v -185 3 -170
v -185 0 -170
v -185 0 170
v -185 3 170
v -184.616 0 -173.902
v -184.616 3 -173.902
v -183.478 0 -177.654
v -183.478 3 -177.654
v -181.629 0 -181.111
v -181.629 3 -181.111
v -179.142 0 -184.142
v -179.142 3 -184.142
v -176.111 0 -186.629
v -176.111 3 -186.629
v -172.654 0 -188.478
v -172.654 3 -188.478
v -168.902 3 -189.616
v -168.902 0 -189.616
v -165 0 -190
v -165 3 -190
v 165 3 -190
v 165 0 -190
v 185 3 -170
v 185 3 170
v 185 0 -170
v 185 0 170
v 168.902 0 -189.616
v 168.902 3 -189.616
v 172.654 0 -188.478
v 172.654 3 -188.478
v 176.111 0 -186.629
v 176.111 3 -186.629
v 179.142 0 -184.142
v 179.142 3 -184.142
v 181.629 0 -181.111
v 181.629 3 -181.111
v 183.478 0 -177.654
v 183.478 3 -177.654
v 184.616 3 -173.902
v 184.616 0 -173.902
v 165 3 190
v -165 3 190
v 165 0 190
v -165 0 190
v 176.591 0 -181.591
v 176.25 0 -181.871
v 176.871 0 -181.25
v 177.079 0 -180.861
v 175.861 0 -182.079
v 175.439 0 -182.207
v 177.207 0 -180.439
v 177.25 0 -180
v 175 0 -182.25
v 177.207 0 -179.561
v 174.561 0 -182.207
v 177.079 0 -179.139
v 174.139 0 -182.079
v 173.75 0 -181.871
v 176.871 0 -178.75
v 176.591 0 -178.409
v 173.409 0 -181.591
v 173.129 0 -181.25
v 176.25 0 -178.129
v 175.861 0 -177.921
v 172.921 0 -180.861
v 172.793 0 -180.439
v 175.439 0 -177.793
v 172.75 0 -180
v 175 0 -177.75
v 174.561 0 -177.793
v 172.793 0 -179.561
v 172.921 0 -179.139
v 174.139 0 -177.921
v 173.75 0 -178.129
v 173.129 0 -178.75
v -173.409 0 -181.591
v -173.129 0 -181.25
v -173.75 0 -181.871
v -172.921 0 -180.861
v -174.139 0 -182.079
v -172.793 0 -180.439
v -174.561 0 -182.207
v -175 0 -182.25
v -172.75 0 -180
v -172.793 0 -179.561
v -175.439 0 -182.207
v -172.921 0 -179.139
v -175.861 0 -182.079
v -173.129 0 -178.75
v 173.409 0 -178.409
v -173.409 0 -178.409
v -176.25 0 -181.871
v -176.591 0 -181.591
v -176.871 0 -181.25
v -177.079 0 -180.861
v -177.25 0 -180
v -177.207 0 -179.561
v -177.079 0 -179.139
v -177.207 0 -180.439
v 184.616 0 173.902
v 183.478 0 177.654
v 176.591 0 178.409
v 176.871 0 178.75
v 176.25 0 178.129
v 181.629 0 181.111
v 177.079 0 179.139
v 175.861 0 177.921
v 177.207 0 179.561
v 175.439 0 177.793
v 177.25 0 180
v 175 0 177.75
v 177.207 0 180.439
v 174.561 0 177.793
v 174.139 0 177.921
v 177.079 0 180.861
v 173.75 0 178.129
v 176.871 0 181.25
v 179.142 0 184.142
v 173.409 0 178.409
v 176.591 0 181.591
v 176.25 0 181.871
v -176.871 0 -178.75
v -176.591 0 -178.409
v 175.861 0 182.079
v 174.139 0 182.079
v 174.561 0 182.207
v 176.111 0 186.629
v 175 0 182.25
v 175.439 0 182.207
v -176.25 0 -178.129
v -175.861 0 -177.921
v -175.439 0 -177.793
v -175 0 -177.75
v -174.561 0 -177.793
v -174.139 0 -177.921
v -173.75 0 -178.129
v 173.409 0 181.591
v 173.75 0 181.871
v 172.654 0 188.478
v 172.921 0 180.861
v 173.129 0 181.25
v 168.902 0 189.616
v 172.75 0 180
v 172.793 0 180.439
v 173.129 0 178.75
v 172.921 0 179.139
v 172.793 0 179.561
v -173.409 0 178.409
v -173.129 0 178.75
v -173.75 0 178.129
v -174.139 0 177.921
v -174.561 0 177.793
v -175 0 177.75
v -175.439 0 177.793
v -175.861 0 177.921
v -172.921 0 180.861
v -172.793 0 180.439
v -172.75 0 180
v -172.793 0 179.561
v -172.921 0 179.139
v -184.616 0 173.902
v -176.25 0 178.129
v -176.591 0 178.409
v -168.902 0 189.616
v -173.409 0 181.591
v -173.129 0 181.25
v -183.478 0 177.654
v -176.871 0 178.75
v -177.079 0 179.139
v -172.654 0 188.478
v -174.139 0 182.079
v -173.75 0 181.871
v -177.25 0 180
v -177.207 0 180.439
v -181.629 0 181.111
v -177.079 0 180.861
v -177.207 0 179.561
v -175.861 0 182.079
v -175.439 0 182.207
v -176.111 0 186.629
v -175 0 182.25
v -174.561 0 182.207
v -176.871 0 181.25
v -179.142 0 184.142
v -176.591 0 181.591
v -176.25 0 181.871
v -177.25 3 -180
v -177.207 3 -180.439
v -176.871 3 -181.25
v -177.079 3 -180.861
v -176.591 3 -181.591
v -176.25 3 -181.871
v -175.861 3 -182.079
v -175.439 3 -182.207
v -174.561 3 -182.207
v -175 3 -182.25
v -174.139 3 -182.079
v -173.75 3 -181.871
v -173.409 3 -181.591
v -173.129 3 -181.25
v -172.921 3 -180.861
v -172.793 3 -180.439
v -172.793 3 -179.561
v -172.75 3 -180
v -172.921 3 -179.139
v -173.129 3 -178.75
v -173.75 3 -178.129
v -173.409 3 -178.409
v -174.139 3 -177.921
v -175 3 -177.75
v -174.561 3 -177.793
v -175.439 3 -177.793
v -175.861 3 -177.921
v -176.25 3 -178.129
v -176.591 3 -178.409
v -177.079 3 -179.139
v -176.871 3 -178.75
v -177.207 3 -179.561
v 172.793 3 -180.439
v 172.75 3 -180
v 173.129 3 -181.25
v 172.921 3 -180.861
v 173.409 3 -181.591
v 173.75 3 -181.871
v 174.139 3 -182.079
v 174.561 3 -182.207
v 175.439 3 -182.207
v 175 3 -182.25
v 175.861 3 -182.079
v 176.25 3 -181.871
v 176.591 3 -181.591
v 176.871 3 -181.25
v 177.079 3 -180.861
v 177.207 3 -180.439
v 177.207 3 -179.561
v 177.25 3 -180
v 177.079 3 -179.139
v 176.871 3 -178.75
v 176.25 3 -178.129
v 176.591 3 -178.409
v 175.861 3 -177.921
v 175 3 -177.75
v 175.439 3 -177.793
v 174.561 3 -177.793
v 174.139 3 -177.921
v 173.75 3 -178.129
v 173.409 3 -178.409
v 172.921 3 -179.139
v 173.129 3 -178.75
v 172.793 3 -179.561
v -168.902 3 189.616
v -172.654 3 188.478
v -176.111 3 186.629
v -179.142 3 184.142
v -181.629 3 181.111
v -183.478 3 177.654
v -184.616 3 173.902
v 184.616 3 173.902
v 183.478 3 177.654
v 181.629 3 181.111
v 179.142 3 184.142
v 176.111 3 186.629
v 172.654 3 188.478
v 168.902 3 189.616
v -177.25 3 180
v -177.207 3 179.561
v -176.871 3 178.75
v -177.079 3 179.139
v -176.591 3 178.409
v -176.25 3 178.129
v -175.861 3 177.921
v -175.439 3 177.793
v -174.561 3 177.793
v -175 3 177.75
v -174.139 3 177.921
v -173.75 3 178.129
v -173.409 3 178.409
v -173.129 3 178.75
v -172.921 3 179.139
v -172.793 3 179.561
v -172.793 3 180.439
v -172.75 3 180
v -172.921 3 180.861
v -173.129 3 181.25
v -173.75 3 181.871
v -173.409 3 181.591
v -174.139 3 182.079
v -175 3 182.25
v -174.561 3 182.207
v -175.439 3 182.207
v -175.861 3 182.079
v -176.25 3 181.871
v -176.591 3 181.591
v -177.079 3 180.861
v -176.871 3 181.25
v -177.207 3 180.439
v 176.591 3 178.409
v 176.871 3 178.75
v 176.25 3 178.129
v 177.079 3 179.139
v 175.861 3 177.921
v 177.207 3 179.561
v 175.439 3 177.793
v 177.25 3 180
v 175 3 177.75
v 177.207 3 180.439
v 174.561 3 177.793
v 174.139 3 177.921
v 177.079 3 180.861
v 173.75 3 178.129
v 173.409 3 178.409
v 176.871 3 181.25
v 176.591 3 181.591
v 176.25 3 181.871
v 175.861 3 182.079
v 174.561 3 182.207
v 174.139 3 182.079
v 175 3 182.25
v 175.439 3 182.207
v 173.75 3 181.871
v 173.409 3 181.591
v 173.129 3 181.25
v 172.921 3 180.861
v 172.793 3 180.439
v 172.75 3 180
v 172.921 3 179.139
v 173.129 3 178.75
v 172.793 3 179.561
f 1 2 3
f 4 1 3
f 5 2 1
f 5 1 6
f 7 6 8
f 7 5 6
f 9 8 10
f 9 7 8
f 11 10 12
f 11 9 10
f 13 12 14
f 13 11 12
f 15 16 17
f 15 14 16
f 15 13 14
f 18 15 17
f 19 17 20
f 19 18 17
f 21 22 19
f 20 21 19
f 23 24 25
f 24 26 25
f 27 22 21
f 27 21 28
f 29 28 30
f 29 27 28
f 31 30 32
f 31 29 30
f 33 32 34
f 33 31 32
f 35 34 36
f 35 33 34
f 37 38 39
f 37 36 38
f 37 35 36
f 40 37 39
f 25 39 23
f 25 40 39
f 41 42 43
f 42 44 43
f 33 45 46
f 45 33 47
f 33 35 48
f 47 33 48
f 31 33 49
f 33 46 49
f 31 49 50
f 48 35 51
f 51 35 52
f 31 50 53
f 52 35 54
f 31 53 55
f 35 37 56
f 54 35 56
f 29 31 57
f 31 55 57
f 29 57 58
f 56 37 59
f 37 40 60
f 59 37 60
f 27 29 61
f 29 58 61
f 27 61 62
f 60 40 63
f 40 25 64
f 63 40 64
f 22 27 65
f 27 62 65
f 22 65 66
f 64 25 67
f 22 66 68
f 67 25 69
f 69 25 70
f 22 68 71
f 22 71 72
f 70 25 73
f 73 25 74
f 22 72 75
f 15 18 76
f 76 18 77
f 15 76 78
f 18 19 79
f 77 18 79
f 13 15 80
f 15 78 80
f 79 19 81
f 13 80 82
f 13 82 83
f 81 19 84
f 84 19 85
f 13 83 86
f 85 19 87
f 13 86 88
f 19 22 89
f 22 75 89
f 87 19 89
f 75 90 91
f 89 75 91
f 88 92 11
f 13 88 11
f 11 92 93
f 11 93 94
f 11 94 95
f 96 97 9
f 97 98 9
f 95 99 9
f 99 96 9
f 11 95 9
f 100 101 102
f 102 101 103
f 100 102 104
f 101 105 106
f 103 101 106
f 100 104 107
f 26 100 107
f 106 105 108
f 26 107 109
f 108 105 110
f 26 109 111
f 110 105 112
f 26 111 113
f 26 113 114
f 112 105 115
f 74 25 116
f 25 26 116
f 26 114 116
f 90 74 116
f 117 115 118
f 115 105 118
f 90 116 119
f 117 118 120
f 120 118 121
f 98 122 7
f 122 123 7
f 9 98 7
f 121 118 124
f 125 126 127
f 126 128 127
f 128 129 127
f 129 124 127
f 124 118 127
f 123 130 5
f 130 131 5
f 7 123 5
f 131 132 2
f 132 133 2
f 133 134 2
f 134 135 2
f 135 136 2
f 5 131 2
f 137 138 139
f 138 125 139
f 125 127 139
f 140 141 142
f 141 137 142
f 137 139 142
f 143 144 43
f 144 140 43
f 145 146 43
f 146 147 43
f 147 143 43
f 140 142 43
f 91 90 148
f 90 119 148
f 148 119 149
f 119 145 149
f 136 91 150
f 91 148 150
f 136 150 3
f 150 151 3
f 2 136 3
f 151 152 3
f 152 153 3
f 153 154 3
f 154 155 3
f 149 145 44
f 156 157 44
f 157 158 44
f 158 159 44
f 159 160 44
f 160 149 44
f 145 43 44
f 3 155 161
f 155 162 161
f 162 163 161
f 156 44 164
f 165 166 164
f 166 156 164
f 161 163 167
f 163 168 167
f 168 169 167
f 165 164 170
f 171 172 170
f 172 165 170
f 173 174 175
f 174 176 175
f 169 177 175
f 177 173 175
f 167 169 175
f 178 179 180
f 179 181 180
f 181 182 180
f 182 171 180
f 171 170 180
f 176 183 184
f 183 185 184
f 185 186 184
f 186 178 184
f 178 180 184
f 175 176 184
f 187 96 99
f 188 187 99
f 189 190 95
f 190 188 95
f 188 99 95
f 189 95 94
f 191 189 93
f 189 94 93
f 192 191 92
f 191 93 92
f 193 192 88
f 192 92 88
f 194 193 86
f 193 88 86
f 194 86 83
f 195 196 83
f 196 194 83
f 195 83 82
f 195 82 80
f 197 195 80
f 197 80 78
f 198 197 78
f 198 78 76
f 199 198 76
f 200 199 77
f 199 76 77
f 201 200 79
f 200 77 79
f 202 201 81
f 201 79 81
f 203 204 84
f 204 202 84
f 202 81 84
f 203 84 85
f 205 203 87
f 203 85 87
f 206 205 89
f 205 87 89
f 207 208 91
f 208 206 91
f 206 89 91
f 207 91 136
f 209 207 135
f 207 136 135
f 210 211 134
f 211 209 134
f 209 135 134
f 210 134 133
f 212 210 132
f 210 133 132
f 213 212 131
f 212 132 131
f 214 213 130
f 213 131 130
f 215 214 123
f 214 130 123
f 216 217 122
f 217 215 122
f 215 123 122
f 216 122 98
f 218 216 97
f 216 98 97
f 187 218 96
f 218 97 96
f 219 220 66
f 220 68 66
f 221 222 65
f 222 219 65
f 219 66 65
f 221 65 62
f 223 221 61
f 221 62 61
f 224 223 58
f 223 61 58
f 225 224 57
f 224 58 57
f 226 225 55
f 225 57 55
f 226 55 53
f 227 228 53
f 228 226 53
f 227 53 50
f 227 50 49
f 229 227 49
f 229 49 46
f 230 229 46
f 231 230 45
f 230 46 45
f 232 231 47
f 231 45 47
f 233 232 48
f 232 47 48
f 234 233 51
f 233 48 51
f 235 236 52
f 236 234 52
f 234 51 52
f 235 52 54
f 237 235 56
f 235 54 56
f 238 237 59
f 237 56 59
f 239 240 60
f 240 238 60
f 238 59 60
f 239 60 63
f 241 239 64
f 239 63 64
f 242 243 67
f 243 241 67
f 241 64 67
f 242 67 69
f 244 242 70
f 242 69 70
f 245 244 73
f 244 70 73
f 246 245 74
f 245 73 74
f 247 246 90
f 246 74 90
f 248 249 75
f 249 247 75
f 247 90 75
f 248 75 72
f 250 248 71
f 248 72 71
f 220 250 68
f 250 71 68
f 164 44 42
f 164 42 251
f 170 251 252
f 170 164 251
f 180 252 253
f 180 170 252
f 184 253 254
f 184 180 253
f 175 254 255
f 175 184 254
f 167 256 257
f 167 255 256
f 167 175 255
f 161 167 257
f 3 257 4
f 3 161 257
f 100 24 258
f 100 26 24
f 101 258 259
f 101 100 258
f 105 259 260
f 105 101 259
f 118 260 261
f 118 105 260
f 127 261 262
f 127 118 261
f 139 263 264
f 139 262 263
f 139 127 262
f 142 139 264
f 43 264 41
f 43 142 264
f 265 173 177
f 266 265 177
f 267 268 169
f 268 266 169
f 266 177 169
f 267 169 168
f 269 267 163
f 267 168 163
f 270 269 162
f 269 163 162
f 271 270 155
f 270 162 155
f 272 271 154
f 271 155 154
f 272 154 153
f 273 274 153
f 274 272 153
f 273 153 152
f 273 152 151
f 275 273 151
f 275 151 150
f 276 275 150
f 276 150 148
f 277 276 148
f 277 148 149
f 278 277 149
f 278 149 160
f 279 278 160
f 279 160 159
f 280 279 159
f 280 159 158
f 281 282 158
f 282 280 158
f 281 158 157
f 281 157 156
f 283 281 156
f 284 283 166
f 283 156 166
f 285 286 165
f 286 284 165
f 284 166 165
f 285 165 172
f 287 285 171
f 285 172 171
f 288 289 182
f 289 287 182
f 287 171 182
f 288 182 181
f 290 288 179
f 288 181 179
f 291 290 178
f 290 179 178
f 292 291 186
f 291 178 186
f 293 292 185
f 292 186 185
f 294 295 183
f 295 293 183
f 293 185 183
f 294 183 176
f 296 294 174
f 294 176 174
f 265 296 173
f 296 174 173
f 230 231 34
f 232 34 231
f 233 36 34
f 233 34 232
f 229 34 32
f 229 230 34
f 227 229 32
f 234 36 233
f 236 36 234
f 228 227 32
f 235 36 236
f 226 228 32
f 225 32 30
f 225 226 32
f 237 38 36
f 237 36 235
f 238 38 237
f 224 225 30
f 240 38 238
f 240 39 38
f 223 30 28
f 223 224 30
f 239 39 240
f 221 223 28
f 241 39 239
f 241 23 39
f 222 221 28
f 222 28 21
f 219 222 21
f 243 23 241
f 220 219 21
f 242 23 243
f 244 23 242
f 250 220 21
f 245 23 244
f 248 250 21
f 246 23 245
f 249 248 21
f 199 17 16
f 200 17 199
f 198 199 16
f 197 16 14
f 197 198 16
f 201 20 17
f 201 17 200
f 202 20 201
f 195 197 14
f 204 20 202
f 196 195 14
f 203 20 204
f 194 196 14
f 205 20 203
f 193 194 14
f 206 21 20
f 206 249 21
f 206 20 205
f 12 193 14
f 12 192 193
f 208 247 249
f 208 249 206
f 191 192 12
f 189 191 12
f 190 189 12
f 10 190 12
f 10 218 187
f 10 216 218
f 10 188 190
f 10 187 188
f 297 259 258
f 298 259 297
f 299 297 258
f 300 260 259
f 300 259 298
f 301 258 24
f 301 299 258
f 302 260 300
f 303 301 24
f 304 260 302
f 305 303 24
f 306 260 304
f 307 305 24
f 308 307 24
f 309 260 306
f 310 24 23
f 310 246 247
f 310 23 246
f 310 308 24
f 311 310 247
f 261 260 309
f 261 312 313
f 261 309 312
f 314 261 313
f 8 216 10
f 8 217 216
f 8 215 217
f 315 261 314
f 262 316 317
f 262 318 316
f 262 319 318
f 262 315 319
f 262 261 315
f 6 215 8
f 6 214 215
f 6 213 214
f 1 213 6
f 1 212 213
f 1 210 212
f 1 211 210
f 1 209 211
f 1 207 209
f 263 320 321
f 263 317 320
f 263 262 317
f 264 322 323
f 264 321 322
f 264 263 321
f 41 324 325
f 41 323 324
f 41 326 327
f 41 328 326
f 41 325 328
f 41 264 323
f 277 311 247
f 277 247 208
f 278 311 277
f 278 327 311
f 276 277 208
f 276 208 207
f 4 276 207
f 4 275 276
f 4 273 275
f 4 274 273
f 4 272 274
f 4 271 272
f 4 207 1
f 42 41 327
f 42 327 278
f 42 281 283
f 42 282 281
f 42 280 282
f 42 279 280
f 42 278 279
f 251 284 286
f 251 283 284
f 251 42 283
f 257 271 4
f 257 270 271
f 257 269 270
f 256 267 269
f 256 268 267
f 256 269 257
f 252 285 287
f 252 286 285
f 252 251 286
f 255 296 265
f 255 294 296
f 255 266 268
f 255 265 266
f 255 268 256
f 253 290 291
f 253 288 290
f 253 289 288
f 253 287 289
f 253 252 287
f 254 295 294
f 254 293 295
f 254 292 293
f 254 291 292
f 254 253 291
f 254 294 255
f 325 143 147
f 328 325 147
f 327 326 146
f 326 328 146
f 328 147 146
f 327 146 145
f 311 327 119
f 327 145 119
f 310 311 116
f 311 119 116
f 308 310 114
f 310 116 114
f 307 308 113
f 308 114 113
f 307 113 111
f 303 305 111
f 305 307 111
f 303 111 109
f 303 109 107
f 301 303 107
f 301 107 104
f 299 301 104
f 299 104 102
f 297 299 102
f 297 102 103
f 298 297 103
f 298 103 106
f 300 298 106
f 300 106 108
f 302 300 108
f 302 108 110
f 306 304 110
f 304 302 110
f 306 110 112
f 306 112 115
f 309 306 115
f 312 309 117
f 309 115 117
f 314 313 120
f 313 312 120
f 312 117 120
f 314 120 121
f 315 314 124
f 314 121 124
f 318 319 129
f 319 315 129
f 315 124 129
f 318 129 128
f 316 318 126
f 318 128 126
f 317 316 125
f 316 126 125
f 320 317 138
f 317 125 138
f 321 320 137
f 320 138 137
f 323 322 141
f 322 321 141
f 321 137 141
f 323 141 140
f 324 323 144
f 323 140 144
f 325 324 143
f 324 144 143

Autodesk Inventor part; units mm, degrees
ref_plane "YZ Plane" through (0, 0, 0) normal (1, 0, 0) x (0, 1, 0)
ref_plane "XZ Plane" through (0, 0, 0) normal (0, 1, 0) x (-1, 0, 0)
ref_plane "XY Plane" through (0, 0, 0) normal (0, 0, 1) x (1, 0, 0)
sketch "Sketch1" plane through (0, 0, 0) normal (0, 1, 0) x (-1, 0, 0)
  line L0 (-165, -190) -> (165, -190)
  line L1 (185, -170) -> (185, 170)
  line L2 (165, 190) -> (-165, 190)
  line L3 (-185, 170) -> (-185, -170)
  line L4 (-185, -190) -> (185, 190) construction
  line L5 (185, -190) -> (-185, 190) construction
  circle A0 centre (175, 180) radius 2.25
  circle A1 centre (175, -180) radius 2.25
  circle A2 centre (-175, 180) radius 2.25
  circle A3 centre (-175, -180) radius 2.25
  arc A4 (-165, 190) -> (-185, 170) centre (-165, 170) ccw
  arc A5 (165, -190) -> (185, -170) centre (165, -170) ccw
  arc A6 (185, 170) -> (165, 190) centre (165, 170) ccw
  arc A7 (-185, -170) -> (-165, -190) centre (-165, -170) ccw
  point P0 (0, 0)
  dimension "d0" = 380
  dimension "d1" = 370
  dimension "d4" = 4.5
  dimension "d5" = 4.5
  dimension "d6" = 10
  dimension "d7" = 10
  dimension "d8" = 10
  dimension "d9" = 10
  dimension "d10" = 4.5
  dimension "d11" = 4.5
  dimension "d12" = 10
  dimension "d13" = 10
  dimension "d14" = 10
  dimension "d15" = 10
  dimension "d16" = 20
  dimension "d17" = 20
  dimension "d18" = 20
  dimension "d19" = 20
extrude "Extrusion2" add sketch "Sketch1" along normal blind 3
equation "\"d8\" = d6"
equation "\"d9\" = d7"
equation "\"d10\" = d4"
equation "\"d11\" = d5"
equation "\"d12\" = d7"
equation "\"d13\" = d6"
equation "\"d14\" = d13"
equation "\"d15\" = d8"
properties part number "right_panel_atx"
